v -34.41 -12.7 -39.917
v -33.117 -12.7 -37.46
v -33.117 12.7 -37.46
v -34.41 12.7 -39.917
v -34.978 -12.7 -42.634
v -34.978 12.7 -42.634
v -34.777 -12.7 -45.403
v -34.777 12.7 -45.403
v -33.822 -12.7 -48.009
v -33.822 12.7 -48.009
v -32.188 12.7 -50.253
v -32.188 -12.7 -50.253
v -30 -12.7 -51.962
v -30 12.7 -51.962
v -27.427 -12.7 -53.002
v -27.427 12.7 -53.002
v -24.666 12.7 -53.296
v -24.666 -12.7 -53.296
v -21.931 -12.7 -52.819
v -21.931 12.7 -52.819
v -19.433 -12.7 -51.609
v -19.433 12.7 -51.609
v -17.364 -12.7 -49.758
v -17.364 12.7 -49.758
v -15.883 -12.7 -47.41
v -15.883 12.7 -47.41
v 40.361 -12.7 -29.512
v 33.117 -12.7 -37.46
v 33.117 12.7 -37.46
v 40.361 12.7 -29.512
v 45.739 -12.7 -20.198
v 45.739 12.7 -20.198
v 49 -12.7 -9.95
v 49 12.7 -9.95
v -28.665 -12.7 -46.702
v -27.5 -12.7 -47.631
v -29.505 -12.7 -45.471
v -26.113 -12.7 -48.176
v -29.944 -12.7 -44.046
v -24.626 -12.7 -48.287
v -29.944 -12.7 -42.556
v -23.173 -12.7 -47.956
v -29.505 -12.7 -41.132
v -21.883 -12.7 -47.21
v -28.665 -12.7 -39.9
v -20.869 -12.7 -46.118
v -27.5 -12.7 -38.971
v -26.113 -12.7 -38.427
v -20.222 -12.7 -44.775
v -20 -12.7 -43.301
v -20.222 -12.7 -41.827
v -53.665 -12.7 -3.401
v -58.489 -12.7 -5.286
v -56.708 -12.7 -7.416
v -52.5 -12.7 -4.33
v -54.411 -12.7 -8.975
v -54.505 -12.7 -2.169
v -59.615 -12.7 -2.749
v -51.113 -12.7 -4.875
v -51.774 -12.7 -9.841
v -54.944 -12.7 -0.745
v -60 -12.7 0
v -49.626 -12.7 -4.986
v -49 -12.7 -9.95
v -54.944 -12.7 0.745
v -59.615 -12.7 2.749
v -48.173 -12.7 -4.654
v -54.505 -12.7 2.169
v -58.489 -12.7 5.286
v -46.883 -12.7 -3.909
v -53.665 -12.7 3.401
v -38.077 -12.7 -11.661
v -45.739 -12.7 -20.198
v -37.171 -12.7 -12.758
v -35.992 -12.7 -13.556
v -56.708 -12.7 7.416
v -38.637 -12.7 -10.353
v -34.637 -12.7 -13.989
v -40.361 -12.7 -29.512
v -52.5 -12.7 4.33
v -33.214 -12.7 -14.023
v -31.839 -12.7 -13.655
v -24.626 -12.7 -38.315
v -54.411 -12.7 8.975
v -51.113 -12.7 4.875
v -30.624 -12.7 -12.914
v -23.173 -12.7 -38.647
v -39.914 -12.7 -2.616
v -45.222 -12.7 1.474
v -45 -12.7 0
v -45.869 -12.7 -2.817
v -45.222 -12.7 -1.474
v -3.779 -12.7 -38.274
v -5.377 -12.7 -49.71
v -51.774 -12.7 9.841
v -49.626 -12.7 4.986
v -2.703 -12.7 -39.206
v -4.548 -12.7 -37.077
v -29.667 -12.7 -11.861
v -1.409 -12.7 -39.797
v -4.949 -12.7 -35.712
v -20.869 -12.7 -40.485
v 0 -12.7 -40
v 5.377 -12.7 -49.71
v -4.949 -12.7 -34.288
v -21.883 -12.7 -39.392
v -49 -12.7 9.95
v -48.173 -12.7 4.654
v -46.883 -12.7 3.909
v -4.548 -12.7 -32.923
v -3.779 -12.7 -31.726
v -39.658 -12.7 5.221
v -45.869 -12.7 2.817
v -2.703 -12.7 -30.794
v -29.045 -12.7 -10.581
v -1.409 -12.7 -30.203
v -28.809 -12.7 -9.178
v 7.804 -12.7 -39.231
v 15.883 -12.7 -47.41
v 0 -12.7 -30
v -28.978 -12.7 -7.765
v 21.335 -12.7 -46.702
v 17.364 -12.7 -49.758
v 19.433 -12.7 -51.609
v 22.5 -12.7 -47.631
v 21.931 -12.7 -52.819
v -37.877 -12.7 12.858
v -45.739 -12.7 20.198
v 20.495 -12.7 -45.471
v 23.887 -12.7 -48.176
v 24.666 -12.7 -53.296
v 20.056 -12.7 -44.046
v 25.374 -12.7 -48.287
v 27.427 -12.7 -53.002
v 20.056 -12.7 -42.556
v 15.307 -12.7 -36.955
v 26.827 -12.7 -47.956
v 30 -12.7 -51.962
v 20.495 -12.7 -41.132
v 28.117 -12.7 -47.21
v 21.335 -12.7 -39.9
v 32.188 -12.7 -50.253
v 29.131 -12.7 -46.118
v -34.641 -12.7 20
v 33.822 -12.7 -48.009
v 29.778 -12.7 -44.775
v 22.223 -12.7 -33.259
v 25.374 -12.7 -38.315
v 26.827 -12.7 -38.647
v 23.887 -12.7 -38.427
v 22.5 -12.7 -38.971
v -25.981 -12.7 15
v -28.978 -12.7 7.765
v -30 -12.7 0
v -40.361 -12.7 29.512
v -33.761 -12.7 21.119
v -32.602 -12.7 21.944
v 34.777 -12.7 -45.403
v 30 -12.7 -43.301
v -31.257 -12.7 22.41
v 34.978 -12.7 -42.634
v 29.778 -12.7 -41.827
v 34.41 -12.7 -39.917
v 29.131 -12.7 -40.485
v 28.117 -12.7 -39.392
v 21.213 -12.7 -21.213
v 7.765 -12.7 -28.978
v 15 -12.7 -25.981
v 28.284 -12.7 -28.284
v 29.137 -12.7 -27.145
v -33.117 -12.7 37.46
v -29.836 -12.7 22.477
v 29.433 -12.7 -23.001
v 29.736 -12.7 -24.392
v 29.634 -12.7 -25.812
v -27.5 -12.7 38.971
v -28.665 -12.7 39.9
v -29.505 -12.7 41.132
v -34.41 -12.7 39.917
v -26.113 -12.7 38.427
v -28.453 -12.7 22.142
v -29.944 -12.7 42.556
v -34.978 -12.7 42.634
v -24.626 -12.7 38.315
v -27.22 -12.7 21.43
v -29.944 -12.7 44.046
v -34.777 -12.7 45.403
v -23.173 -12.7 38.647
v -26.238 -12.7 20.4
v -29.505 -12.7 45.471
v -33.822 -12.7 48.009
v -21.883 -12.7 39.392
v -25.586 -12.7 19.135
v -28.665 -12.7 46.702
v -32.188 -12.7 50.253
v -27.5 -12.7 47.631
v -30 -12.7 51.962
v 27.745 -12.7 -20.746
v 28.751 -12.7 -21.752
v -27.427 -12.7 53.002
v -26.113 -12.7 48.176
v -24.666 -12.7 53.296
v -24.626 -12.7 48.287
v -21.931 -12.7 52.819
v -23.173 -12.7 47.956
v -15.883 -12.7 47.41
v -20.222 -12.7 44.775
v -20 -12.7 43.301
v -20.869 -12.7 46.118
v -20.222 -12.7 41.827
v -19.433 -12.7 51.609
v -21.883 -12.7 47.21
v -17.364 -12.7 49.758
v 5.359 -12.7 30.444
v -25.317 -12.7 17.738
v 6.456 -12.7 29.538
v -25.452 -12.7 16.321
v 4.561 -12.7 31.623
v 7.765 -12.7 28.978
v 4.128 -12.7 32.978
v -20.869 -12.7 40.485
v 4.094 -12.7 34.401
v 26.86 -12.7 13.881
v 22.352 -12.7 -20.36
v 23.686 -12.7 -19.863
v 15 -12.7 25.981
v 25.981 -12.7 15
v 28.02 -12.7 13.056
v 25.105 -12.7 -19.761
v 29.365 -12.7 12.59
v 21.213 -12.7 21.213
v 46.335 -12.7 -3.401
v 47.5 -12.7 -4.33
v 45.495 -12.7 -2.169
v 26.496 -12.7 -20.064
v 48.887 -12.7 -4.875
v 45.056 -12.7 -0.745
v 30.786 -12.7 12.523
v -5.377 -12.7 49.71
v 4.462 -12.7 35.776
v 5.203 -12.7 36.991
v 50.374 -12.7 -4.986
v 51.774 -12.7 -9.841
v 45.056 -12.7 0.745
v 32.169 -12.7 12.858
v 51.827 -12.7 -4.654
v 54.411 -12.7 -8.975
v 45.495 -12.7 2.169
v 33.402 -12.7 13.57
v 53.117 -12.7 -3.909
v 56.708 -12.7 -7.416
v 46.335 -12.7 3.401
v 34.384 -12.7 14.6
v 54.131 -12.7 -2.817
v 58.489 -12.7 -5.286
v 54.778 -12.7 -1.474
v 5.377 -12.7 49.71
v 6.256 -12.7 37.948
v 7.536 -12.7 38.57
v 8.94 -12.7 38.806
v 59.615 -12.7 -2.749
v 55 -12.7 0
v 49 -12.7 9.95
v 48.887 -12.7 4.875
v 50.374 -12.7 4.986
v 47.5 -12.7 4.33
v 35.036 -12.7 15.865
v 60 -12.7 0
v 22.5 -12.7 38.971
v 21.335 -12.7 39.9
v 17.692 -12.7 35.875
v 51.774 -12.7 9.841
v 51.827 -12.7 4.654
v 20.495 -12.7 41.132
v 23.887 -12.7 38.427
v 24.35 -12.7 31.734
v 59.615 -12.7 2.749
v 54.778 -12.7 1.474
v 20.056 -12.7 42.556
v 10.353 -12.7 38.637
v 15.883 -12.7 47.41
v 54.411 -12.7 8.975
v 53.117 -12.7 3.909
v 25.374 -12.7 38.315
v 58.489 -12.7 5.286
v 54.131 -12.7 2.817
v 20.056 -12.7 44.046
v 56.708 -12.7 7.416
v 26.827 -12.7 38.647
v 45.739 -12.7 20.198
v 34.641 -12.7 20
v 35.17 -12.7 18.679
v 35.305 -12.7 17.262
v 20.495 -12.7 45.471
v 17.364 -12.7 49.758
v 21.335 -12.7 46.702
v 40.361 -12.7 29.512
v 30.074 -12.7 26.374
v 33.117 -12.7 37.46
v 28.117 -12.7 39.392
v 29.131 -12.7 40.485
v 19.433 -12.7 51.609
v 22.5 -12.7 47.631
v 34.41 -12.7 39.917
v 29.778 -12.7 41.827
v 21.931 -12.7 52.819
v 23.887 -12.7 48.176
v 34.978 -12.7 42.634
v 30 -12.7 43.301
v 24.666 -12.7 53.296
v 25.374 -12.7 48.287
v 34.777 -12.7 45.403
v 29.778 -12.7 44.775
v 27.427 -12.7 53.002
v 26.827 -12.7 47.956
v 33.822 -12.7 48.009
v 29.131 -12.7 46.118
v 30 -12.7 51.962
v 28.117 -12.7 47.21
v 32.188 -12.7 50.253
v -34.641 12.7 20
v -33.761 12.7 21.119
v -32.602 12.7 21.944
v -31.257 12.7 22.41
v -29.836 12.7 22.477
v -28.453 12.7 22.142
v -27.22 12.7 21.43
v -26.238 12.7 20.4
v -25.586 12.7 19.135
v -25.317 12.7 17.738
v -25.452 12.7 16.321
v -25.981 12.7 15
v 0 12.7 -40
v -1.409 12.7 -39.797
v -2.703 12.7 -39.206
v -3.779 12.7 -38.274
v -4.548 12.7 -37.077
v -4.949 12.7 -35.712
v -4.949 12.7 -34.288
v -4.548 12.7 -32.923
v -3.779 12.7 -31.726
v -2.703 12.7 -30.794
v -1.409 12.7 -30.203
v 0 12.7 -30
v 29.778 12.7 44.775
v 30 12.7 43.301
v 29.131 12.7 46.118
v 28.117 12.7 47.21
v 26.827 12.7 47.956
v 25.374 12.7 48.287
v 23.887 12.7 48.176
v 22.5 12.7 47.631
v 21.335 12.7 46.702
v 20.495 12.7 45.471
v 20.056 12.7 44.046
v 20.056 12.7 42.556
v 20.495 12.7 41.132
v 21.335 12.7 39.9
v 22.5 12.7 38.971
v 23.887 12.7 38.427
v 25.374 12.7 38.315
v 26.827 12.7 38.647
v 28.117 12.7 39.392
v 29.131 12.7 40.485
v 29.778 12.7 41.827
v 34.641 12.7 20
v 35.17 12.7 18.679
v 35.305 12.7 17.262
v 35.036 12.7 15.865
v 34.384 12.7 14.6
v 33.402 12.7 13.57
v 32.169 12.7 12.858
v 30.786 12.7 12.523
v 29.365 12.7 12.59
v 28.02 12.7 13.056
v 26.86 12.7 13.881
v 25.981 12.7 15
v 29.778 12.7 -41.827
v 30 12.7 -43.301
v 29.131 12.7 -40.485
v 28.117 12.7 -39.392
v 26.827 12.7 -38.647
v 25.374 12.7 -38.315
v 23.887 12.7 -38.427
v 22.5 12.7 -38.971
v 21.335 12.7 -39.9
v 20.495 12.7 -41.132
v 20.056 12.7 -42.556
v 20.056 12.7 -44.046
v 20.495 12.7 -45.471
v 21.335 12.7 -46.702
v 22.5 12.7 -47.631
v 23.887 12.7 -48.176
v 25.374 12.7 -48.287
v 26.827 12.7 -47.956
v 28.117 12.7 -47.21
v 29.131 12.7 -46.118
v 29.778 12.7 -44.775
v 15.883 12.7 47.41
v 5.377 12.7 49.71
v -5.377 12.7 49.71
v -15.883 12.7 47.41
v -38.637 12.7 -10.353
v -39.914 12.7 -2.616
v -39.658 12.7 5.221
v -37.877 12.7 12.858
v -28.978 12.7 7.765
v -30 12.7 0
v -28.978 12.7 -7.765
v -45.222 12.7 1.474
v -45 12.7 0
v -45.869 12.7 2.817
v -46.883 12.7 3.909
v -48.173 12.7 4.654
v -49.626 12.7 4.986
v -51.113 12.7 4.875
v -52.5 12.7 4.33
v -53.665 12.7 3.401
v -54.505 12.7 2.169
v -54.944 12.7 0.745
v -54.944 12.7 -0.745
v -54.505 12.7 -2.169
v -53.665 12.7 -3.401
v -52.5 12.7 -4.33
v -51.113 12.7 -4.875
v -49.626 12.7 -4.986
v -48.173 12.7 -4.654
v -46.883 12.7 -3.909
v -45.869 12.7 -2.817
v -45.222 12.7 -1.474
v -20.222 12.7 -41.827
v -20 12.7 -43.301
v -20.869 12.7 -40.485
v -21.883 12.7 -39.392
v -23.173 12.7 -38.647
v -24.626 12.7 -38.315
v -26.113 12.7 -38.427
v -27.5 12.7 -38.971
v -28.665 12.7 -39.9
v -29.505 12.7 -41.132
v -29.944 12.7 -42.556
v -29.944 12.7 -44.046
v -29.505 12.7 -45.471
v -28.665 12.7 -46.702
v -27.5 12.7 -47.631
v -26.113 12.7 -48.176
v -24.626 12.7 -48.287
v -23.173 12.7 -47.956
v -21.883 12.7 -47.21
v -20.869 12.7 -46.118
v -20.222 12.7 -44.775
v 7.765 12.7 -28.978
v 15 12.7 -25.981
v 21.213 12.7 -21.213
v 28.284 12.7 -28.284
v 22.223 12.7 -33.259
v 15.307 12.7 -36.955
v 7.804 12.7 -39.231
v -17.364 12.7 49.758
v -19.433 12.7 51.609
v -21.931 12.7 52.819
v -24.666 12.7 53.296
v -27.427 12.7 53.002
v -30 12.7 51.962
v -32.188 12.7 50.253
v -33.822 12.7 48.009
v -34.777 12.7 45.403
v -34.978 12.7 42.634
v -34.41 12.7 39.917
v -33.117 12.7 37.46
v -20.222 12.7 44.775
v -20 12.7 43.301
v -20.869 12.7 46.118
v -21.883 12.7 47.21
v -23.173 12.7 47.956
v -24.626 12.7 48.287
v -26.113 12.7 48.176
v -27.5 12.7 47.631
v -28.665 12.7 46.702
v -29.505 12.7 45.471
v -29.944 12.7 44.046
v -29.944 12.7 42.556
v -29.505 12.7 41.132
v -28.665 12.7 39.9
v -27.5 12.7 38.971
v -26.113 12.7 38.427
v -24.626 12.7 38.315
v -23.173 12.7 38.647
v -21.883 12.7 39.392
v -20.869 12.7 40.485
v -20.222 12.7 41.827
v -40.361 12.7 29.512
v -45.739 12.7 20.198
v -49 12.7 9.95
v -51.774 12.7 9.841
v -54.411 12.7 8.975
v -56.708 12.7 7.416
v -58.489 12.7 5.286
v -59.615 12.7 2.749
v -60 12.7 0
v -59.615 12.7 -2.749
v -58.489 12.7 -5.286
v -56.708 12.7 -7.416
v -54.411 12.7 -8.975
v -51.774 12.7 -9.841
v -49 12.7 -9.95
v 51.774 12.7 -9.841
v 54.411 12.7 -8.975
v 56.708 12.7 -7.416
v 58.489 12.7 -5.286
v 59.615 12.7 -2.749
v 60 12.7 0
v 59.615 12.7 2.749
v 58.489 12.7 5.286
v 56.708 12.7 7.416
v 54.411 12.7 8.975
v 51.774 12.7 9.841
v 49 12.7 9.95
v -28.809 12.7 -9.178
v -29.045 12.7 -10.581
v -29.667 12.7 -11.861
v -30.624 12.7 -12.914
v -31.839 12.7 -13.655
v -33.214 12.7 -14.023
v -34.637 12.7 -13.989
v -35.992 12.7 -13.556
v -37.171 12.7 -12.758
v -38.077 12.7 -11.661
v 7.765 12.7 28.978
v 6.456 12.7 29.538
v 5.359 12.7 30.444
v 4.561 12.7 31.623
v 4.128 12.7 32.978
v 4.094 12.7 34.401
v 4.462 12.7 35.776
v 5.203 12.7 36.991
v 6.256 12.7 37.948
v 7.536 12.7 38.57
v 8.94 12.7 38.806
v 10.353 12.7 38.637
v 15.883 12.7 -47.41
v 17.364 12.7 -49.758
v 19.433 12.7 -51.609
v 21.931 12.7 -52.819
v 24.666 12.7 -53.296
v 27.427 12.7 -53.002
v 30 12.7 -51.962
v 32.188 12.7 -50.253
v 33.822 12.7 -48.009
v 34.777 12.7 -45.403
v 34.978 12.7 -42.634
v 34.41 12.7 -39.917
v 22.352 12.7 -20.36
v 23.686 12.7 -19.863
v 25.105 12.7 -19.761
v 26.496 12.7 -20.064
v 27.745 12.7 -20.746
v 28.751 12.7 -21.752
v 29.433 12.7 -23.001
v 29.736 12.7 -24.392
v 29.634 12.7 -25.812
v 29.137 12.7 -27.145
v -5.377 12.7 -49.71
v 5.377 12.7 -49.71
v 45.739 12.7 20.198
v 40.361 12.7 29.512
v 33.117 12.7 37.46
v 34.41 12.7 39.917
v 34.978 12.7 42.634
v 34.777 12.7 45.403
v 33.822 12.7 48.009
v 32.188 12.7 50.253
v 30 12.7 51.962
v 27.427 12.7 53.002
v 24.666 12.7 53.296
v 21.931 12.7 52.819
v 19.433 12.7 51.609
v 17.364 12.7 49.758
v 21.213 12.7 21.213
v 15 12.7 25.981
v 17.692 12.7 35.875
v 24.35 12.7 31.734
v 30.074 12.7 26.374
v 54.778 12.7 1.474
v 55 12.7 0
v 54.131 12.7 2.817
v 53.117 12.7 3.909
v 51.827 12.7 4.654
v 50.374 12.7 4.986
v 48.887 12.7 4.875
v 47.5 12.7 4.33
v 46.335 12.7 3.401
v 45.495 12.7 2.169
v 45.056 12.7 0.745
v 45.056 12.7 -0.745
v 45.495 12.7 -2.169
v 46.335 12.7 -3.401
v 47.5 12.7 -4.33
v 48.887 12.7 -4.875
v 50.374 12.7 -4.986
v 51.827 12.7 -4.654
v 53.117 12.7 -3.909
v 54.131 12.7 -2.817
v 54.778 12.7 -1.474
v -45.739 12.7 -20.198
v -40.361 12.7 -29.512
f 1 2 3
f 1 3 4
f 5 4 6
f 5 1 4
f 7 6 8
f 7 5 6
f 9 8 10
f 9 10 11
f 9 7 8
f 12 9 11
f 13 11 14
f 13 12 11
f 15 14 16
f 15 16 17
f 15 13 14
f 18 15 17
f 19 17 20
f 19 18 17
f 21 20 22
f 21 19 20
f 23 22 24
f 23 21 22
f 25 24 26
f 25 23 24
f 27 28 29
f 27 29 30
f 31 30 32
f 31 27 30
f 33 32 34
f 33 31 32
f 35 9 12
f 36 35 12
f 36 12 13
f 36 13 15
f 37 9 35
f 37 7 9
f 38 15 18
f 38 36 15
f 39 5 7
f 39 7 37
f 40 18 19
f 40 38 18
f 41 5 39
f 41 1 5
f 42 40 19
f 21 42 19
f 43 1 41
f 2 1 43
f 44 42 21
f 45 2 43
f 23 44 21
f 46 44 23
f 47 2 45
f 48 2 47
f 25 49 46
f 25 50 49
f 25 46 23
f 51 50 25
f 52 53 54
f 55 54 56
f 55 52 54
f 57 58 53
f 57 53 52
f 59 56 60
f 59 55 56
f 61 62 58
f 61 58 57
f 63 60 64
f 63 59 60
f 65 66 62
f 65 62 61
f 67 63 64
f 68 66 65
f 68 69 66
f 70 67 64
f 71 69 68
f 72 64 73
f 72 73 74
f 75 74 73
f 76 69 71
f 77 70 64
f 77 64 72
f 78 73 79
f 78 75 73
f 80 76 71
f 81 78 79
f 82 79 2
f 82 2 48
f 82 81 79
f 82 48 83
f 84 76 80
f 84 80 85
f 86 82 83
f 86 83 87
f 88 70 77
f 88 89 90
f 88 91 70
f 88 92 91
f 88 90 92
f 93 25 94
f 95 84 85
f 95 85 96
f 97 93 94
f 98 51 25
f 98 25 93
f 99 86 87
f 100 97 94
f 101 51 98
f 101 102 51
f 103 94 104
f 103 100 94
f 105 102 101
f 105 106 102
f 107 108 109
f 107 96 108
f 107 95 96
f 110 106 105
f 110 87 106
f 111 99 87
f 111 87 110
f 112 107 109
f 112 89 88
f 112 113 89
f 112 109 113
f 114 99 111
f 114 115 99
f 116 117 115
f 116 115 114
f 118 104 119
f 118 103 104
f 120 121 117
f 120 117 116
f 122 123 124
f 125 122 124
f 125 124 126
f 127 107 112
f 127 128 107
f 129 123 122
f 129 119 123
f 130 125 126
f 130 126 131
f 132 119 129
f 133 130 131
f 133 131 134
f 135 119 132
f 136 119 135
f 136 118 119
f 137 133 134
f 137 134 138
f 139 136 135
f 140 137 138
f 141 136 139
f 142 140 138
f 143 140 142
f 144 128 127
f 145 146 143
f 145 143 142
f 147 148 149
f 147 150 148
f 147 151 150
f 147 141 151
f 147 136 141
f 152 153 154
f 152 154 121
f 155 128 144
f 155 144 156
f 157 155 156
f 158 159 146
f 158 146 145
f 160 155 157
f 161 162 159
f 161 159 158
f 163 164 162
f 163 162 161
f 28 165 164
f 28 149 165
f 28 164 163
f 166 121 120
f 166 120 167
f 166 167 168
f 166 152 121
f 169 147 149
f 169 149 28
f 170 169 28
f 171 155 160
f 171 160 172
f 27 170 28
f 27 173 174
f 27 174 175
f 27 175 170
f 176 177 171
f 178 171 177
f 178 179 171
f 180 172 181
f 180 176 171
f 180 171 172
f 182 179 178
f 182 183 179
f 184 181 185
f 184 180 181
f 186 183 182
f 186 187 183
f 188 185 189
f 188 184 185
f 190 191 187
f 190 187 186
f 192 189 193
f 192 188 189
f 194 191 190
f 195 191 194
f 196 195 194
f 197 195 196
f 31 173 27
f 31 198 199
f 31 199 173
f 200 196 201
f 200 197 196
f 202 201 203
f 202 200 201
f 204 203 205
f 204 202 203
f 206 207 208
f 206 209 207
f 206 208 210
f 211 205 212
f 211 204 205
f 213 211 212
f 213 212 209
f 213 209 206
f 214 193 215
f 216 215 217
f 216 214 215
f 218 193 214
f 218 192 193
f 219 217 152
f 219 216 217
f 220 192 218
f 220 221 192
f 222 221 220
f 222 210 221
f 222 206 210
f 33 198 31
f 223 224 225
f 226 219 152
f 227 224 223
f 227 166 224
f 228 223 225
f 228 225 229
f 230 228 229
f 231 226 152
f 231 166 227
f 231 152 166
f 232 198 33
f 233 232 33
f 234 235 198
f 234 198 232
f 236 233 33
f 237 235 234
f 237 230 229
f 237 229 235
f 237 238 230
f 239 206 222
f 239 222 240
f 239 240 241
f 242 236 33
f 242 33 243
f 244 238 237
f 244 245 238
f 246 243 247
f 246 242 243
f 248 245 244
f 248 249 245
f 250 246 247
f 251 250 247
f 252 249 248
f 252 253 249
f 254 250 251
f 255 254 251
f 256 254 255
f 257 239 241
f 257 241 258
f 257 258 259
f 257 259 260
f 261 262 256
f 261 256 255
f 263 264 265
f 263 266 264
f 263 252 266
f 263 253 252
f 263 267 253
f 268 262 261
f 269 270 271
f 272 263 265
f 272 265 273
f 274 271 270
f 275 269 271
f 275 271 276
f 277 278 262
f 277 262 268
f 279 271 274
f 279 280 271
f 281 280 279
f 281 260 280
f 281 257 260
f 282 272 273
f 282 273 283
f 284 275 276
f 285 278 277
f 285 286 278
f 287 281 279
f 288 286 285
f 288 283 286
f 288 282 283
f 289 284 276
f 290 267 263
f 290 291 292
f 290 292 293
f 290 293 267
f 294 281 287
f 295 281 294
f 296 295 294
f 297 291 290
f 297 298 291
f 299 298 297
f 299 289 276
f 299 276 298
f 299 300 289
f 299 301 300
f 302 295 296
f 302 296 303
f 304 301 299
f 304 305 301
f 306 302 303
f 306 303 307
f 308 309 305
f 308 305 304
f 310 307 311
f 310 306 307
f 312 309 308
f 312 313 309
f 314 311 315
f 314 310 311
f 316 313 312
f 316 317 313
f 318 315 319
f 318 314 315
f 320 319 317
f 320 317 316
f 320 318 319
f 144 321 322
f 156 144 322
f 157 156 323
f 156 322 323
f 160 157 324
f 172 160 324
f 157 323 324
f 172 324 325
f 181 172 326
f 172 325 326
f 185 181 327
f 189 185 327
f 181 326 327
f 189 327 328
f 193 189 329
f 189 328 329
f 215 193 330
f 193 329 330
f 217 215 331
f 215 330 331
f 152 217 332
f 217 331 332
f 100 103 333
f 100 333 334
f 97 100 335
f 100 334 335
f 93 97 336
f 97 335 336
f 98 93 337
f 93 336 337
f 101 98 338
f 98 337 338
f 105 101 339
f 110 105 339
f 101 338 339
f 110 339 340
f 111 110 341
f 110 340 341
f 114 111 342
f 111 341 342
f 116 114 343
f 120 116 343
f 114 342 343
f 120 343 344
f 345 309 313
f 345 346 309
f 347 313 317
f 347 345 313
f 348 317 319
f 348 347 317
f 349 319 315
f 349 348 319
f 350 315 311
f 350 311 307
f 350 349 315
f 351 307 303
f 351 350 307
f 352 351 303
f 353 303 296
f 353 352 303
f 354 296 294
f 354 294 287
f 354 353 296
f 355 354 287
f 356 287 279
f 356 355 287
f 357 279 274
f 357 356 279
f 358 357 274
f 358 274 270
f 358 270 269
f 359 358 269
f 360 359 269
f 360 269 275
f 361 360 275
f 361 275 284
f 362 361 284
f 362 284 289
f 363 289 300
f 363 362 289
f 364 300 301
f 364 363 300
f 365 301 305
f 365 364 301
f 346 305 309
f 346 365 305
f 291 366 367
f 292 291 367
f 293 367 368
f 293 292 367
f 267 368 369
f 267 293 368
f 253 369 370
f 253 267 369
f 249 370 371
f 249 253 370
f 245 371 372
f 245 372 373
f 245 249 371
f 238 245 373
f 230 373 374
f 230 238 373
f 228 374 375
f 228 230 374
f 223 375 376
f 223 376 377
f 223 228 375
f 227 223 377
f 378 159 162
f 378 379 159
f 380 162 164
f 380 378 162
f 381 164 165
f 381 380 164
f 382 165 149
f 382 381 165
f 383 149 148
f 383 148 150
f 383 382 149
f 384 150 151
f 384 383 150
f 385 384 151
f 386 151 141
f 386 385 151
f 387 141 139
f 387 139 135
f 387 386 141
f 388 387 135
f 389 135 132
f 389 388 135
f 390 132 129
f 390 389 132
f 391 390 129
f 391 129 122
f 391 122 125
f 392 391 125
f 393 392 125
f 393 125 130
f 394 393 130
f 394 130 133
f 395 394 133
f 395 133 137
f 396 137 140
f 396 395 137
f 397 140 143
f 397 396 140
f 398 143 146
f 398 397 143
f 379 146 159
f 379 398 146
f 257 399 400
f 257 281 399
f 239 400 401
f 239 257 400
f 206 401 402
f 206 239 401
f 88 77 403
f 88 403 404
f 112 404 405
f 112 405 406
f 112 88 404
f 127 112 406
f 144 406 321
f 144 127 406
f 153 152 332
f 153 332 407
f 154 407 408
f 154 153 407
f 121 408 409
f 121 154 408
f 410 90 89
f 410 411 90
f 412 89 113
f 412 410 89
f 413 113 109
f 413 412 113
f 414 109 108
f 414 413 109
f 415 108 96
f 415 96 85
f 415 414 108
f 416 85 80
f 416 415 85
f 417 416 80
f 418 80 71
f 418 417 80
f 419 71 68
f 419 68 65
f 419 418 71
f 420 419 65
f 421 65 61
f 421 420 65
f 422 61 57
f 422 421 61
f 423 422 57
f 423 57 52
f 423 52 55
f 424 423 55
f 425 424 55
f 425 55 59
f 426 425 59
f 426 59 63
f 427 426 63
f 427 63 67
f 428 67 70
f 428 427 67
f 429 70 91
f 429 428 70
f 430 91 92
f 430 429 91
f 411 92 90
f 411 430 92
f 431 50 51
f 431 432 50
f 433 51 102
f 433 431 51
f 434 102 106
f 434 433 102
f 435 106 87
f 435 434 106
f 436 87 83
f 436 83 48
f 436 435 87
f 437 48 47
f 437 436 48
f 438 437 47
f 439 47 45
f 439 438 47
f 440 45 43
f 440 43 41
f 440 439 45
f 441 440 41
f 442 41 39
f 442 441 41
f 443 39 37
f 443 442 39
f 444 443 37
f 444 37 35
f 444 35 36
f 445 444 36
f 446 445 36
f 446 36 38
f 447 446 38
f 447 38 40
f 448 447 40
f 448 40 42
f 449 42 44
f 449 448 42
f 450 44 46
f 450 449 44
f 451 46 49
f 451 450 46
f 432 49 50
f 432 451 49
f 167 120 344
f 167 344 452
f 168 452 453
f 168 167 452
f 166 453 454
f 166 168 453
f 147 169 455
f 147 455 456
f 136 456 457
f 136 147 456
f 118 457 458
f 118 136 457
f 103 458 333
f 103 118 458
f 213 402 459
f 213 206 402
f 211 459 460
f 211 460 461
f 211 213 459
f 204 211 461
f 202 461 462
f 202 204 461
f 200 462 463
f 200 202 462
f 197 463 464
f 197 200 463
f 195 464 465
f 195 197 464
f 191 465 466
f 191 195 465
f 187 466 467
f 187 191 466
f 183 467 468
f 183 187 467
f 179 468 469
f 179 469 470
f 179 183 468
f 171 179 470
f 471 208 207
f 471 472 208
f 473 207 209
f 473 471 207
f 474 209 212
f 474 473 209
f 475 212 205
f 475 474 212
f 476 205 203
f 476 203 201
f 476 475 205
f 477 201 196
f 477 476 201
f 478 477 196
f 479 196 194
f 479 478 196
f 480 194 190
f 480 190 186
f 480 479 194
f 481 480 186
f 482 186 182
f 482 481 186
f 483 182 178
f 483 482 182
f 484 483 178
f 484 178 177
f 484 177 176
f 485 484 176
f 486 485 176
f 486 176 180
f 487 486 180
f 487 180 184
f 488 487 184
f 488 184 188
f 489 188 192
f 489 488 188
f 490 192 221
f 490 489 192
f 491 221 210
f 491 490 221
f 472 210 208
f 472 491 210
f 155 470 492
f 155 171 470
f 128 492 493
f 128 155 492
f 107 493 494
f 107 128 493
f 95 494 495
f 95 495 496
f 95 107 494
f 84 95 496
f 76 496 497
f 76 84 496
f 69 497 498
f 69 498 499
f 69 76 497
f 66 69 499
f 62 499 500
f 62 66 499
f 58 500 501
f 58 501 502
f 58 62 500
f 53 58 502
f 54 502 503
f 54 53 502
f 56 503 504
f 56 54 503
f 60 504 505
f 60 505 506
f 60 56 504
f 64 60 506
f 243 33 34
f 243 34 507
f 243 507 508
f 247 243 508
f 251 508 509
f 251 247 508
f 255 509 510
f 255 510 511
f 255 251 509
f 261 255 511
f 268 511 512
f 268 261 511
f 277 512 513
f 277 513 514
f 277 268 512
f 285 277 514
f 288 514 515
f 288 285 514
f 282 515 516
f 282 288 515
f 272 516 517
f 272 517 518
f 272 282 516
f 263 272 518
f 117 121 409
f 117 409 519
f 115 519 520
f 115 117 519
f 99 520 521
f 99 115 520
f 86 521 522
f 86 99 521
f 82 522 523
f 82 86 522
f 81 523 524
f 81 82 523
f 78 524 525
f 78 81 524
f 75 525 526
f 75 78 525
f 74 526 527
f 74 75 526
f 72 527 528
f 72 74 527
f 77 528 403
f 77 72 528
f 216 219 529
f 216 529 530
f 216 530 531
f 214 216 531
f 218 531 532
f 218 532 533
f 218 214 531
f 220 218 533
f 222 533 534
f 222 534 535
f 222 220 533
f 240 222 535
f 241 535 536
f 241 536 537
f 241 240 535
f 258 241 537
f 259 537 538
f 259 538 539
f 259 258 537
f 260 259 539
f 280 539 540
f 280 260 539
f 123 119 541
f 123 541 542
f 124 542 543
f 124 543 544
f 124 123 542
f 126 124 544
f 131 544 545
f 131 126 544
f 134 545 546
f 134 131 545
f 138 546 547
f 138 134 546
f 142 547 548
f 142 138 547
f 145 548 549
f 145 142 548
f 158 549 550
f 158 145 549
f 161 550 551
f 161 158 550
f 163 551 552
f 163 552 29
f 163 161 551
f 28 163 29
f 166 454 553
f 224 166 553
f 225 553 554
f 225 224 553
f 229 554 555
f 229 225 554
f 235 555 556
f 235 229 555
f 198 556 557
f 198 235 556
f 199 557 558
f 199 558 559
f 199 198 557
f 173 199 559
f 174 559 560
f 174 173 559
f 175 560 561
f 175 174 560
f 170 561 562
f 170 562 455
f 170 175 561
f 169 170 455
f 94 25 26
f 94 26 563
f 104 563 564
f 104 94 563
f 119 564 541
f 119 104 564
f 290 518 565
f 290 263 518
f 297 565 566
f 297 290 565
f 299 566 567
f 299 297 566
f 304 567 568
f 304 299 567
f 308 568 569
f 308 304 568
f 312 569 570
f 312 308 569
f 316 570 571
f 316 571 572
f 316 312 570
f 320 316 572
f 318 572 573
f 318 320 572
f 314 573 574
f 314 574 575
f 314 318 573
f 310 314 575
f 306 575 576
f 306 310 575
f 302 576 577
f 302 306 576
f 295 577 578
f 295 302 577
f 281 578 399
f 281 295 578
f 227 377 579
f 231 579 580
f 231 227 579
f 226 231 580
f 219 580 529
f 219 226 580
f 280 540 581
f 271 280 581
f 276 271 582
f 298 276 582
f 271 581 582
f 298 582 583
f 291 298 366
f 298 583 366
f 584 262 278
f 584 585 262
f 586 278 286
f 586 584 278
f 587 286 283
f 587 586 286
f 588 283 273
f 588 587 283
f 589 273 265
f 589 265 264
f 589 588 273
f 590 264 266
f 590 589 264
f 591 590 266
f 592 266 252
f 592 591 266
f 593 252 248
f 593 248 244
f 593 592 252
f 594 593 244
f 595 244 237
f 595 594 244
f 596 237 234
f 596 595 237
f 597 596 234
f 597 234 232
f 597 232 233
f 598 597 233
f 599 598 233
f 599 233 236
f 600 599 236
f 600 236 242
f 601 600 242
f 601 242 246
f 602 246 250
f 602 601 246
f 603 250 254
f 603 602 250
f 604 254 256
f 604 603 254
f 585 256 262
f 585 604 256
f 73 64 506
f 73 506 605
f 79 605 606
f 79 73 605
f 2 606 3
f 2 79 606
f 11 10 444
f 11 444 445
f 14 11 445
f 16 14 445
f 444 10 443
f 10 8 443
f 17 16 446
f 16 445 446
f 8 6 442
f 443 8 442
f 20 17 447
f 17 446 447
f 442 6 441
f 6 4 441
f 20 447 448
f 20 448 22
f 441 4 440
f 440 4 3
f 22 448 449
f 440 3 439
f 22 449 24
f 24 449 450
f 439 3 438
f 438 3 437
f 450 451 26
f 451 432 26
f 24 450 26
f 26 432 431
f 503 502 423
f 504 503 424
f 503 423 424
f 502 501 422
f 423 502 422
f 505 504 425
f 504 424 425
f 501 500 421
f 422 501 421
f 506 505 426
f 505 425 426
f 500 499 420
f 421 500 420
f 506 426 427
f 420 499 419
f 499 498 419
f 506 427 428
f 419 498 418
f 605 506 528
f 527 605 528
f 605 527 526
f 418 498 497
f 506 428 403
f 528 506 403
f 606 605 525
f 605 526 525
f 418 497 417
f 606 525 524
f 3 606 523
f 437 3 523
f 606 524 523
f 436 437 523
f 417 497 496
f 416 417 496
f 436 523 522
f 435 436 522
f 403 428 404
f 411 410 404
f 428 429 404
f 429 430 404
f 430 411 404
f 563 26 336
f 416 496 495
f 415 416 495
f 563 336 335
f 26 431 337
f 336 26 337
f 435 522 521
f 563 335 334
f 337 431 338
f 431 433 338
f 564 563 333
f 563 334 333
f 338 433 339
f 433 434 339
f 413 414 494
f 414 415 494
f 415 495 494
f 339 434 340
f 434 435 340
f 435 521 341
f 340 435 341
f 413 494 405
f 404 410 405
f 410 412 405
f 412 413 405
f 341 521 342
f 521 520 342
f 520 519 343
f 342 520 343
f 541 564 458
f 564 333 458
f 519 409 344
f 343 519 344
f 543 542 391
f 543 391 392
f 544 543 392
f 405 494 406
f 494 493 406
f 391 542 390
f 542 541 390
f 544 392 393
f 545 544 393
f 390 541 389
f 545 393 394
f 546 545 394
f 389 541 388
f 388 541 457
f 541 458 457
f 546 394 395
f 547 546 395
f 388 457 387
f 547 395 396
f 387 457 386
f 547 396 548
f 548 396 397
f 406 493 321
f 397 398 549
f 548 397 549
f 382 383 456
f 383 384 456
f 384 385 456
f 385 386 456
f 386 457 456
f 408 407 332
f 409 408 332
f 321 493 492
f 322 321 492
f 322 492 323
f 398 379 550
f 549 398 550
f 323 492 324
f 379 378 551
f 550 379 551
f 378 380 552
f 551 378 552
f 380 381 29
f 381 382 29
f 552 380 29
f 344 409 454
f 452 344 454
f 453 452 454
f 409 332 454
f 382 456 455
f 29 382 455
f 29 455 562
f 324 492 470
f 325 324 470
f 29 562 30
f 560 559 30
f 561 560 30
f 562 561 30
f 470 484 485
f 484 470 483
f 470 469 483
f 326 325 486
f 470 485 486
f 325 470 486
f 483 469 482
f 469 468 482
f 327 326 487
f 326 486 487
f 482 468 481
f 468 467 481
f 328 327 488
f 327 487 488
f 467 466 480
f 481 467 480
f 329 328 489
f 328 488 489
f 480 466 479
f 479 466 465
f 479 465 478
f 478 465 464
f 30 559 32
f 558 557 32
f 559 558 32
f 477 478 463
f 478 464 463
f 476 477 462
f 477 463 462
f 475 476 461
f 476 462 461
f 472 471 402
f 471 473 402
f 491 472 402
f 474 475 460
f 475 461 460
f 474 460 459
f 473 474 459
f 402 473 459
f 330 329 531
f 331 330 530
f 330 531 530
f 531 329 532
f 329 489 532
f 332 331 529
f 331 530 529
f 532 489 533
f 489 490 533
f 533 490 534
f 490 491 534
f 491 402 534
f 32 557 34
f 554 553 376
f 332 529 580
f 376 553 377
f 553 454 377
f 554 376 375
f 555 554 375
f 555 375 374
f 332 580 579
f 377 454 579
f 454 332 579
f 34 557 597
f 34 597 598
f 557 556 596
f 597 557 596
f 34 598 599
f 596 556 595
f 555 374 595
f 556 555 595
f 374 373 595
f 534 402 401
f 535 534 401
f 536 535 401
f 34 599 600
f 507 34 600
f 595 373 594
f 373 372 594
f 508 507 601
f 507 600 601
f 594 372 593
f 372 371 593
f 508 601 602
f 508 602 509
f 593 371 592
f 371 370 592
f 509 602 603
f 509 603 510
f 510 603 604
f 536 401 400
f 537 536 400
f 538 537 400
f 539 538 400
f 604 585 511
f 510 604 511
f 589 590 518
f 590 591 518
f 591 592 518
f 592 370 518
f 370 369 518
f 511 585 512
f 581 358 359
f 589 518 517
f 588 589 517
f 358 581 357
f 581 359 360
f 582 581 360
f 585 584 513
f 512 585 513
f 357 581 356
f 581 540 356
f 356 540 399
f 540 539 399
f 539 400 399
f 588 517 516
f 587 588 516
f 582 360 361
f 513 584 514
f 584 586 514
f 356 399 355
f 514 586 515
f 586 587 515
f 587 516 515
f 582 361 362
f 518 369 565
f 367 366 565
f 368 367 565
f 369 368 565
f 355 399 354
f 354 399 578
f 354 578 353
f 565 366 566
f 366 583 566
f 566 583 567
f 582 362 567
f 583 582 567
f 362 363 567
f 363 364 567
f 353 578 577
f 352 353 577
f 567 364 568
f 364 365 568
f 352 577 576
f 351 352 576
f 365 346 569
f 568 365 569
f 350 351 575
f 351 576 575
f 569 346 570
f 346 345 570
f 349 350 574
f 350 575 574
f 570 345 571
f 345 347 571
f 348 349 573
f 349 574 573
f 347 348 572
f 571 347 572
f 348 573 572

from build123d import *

# Parameters (mm, degrees)
F0_R     = 5
F1_DEPTH = 12.7


with BuildPart() as f1:
    # F0 (on Front) → F1 (new body, symmetric)
    with BuildSketch(Plane.XZ):
        with BuildLine():
            ThreePointArc((-49, 9.949874), (-60, 0), (-49, -9.949874))
            ThreePointArc((-49, -9.949874), (-43.30127, -25), (-33.116844, -37.460308))
            ThreePointArc((-33.116844, -37.460308), (-30, -51.961524), (-15.883156, -47.410182))
            ThreePointArc((-15.883156, -47.410182), (0, -50), (15.883156, -47.410182))
            ThreePointArc((15.883156, -47.410182), (30, -51.961524), (33.116844, -37.460308))
            ThreePointArc((33.116844, -37.460308), (43.30127, -25), (49, -9.949874))
            ThreePointArc((49, -9.949874), (60, 0), (49, 9.949874))
            ThreePointArc((49, 9.949874), (43.30127, 25), (33.116844, 37.460308))
            ThreePointArc((33.116844, 37.460308), (30, 51.961524), (15.883156, 47.410182))
            ThreePointArc((15.883156, 47.410182), (0, 50), (-15.883156, 47.410182))
            ThreePointArc((-15.883156, 47.410182), (-30, 51.961524), (-33.116844, 37.460308))
            ThreePointArc((-33.116844, 37.460308), (-43.30127, 25), (-49, 9.949874))
        make_face()
        with Locations((-25, -43.30127)):
            Circle(F0_R, mode=Mode.SUBTRACT)
        with Locations((25, -43.30127)):
            Circle(F0_R, mode=Mode.SUBTRACT)
        with BuildLine():
            ThreePointArc((28.284271, -28.284271), (15.307337, -36.955181), (0, -40))
            ThreePointArc((0, -40), (-5, -35), (0, -30))
            ThreePointArc((0, -30), (11.480503, -27.716386), (21.213203, -21.213203))
            ThreePointArc((21.213203, -21.213203), (28.284271, -21.213203), (28.284271, -28.284271))
        make_face(mode=Mode.SUBTRACT)
        with Locations((-50, 0)):
            Circle(F0_R, mode=Mode.SUBTRACT)
        with BuildLine():
            ThreePointArc((-38.637033, -10.352762), (-39.657794, 5.221048), (-34.641016, 20))
            ThreePointArc((-34.641016, 20), (-27.810889, 21.830127), (-25.980762, 15))
            ThreePointArc((-25.980762, 15), (-29.743346, 3.915786), (-28.977775, -7.764571))
            ThreePointArc((-28.977775, -7.764571), (-32.513309, -13.888296), (-38.637033, -10.352762))
        make_face(mode=Mode.SUBTRACT)
        with Locations((-25, 43.30127)):
            Circle(F0_R, mode=Mode.SUBTRACT)
        with BuildLine():
            ThreePointArc((7.764571, 28.977775), (4.229037, 35.101499), (10.352762, 38.637033))
            ThreePointArc((10.352762, 38.637033), (24.350457, 31.734134), (34.641016, 20))
            ThreePointArc((34.641016, 20), (32.810889, 13.169873), (25.980762, 15))
            ThreePointArc((25.980762, 15), (18.262843, 23.8006), (7.764571, 28.977775))
        make_face(mode=Mode.SUBTRACT)
        with Locations((50, 0)):
            Circle(F0_R, mode=Mode.SUBTRACT)
        with Locations((25, 43.30127)):
            Circle(F0_R, mode=Mode.SUBTRACT)
    extrude(amount=F1_DEPTH, both=True)


solid = f1.part
